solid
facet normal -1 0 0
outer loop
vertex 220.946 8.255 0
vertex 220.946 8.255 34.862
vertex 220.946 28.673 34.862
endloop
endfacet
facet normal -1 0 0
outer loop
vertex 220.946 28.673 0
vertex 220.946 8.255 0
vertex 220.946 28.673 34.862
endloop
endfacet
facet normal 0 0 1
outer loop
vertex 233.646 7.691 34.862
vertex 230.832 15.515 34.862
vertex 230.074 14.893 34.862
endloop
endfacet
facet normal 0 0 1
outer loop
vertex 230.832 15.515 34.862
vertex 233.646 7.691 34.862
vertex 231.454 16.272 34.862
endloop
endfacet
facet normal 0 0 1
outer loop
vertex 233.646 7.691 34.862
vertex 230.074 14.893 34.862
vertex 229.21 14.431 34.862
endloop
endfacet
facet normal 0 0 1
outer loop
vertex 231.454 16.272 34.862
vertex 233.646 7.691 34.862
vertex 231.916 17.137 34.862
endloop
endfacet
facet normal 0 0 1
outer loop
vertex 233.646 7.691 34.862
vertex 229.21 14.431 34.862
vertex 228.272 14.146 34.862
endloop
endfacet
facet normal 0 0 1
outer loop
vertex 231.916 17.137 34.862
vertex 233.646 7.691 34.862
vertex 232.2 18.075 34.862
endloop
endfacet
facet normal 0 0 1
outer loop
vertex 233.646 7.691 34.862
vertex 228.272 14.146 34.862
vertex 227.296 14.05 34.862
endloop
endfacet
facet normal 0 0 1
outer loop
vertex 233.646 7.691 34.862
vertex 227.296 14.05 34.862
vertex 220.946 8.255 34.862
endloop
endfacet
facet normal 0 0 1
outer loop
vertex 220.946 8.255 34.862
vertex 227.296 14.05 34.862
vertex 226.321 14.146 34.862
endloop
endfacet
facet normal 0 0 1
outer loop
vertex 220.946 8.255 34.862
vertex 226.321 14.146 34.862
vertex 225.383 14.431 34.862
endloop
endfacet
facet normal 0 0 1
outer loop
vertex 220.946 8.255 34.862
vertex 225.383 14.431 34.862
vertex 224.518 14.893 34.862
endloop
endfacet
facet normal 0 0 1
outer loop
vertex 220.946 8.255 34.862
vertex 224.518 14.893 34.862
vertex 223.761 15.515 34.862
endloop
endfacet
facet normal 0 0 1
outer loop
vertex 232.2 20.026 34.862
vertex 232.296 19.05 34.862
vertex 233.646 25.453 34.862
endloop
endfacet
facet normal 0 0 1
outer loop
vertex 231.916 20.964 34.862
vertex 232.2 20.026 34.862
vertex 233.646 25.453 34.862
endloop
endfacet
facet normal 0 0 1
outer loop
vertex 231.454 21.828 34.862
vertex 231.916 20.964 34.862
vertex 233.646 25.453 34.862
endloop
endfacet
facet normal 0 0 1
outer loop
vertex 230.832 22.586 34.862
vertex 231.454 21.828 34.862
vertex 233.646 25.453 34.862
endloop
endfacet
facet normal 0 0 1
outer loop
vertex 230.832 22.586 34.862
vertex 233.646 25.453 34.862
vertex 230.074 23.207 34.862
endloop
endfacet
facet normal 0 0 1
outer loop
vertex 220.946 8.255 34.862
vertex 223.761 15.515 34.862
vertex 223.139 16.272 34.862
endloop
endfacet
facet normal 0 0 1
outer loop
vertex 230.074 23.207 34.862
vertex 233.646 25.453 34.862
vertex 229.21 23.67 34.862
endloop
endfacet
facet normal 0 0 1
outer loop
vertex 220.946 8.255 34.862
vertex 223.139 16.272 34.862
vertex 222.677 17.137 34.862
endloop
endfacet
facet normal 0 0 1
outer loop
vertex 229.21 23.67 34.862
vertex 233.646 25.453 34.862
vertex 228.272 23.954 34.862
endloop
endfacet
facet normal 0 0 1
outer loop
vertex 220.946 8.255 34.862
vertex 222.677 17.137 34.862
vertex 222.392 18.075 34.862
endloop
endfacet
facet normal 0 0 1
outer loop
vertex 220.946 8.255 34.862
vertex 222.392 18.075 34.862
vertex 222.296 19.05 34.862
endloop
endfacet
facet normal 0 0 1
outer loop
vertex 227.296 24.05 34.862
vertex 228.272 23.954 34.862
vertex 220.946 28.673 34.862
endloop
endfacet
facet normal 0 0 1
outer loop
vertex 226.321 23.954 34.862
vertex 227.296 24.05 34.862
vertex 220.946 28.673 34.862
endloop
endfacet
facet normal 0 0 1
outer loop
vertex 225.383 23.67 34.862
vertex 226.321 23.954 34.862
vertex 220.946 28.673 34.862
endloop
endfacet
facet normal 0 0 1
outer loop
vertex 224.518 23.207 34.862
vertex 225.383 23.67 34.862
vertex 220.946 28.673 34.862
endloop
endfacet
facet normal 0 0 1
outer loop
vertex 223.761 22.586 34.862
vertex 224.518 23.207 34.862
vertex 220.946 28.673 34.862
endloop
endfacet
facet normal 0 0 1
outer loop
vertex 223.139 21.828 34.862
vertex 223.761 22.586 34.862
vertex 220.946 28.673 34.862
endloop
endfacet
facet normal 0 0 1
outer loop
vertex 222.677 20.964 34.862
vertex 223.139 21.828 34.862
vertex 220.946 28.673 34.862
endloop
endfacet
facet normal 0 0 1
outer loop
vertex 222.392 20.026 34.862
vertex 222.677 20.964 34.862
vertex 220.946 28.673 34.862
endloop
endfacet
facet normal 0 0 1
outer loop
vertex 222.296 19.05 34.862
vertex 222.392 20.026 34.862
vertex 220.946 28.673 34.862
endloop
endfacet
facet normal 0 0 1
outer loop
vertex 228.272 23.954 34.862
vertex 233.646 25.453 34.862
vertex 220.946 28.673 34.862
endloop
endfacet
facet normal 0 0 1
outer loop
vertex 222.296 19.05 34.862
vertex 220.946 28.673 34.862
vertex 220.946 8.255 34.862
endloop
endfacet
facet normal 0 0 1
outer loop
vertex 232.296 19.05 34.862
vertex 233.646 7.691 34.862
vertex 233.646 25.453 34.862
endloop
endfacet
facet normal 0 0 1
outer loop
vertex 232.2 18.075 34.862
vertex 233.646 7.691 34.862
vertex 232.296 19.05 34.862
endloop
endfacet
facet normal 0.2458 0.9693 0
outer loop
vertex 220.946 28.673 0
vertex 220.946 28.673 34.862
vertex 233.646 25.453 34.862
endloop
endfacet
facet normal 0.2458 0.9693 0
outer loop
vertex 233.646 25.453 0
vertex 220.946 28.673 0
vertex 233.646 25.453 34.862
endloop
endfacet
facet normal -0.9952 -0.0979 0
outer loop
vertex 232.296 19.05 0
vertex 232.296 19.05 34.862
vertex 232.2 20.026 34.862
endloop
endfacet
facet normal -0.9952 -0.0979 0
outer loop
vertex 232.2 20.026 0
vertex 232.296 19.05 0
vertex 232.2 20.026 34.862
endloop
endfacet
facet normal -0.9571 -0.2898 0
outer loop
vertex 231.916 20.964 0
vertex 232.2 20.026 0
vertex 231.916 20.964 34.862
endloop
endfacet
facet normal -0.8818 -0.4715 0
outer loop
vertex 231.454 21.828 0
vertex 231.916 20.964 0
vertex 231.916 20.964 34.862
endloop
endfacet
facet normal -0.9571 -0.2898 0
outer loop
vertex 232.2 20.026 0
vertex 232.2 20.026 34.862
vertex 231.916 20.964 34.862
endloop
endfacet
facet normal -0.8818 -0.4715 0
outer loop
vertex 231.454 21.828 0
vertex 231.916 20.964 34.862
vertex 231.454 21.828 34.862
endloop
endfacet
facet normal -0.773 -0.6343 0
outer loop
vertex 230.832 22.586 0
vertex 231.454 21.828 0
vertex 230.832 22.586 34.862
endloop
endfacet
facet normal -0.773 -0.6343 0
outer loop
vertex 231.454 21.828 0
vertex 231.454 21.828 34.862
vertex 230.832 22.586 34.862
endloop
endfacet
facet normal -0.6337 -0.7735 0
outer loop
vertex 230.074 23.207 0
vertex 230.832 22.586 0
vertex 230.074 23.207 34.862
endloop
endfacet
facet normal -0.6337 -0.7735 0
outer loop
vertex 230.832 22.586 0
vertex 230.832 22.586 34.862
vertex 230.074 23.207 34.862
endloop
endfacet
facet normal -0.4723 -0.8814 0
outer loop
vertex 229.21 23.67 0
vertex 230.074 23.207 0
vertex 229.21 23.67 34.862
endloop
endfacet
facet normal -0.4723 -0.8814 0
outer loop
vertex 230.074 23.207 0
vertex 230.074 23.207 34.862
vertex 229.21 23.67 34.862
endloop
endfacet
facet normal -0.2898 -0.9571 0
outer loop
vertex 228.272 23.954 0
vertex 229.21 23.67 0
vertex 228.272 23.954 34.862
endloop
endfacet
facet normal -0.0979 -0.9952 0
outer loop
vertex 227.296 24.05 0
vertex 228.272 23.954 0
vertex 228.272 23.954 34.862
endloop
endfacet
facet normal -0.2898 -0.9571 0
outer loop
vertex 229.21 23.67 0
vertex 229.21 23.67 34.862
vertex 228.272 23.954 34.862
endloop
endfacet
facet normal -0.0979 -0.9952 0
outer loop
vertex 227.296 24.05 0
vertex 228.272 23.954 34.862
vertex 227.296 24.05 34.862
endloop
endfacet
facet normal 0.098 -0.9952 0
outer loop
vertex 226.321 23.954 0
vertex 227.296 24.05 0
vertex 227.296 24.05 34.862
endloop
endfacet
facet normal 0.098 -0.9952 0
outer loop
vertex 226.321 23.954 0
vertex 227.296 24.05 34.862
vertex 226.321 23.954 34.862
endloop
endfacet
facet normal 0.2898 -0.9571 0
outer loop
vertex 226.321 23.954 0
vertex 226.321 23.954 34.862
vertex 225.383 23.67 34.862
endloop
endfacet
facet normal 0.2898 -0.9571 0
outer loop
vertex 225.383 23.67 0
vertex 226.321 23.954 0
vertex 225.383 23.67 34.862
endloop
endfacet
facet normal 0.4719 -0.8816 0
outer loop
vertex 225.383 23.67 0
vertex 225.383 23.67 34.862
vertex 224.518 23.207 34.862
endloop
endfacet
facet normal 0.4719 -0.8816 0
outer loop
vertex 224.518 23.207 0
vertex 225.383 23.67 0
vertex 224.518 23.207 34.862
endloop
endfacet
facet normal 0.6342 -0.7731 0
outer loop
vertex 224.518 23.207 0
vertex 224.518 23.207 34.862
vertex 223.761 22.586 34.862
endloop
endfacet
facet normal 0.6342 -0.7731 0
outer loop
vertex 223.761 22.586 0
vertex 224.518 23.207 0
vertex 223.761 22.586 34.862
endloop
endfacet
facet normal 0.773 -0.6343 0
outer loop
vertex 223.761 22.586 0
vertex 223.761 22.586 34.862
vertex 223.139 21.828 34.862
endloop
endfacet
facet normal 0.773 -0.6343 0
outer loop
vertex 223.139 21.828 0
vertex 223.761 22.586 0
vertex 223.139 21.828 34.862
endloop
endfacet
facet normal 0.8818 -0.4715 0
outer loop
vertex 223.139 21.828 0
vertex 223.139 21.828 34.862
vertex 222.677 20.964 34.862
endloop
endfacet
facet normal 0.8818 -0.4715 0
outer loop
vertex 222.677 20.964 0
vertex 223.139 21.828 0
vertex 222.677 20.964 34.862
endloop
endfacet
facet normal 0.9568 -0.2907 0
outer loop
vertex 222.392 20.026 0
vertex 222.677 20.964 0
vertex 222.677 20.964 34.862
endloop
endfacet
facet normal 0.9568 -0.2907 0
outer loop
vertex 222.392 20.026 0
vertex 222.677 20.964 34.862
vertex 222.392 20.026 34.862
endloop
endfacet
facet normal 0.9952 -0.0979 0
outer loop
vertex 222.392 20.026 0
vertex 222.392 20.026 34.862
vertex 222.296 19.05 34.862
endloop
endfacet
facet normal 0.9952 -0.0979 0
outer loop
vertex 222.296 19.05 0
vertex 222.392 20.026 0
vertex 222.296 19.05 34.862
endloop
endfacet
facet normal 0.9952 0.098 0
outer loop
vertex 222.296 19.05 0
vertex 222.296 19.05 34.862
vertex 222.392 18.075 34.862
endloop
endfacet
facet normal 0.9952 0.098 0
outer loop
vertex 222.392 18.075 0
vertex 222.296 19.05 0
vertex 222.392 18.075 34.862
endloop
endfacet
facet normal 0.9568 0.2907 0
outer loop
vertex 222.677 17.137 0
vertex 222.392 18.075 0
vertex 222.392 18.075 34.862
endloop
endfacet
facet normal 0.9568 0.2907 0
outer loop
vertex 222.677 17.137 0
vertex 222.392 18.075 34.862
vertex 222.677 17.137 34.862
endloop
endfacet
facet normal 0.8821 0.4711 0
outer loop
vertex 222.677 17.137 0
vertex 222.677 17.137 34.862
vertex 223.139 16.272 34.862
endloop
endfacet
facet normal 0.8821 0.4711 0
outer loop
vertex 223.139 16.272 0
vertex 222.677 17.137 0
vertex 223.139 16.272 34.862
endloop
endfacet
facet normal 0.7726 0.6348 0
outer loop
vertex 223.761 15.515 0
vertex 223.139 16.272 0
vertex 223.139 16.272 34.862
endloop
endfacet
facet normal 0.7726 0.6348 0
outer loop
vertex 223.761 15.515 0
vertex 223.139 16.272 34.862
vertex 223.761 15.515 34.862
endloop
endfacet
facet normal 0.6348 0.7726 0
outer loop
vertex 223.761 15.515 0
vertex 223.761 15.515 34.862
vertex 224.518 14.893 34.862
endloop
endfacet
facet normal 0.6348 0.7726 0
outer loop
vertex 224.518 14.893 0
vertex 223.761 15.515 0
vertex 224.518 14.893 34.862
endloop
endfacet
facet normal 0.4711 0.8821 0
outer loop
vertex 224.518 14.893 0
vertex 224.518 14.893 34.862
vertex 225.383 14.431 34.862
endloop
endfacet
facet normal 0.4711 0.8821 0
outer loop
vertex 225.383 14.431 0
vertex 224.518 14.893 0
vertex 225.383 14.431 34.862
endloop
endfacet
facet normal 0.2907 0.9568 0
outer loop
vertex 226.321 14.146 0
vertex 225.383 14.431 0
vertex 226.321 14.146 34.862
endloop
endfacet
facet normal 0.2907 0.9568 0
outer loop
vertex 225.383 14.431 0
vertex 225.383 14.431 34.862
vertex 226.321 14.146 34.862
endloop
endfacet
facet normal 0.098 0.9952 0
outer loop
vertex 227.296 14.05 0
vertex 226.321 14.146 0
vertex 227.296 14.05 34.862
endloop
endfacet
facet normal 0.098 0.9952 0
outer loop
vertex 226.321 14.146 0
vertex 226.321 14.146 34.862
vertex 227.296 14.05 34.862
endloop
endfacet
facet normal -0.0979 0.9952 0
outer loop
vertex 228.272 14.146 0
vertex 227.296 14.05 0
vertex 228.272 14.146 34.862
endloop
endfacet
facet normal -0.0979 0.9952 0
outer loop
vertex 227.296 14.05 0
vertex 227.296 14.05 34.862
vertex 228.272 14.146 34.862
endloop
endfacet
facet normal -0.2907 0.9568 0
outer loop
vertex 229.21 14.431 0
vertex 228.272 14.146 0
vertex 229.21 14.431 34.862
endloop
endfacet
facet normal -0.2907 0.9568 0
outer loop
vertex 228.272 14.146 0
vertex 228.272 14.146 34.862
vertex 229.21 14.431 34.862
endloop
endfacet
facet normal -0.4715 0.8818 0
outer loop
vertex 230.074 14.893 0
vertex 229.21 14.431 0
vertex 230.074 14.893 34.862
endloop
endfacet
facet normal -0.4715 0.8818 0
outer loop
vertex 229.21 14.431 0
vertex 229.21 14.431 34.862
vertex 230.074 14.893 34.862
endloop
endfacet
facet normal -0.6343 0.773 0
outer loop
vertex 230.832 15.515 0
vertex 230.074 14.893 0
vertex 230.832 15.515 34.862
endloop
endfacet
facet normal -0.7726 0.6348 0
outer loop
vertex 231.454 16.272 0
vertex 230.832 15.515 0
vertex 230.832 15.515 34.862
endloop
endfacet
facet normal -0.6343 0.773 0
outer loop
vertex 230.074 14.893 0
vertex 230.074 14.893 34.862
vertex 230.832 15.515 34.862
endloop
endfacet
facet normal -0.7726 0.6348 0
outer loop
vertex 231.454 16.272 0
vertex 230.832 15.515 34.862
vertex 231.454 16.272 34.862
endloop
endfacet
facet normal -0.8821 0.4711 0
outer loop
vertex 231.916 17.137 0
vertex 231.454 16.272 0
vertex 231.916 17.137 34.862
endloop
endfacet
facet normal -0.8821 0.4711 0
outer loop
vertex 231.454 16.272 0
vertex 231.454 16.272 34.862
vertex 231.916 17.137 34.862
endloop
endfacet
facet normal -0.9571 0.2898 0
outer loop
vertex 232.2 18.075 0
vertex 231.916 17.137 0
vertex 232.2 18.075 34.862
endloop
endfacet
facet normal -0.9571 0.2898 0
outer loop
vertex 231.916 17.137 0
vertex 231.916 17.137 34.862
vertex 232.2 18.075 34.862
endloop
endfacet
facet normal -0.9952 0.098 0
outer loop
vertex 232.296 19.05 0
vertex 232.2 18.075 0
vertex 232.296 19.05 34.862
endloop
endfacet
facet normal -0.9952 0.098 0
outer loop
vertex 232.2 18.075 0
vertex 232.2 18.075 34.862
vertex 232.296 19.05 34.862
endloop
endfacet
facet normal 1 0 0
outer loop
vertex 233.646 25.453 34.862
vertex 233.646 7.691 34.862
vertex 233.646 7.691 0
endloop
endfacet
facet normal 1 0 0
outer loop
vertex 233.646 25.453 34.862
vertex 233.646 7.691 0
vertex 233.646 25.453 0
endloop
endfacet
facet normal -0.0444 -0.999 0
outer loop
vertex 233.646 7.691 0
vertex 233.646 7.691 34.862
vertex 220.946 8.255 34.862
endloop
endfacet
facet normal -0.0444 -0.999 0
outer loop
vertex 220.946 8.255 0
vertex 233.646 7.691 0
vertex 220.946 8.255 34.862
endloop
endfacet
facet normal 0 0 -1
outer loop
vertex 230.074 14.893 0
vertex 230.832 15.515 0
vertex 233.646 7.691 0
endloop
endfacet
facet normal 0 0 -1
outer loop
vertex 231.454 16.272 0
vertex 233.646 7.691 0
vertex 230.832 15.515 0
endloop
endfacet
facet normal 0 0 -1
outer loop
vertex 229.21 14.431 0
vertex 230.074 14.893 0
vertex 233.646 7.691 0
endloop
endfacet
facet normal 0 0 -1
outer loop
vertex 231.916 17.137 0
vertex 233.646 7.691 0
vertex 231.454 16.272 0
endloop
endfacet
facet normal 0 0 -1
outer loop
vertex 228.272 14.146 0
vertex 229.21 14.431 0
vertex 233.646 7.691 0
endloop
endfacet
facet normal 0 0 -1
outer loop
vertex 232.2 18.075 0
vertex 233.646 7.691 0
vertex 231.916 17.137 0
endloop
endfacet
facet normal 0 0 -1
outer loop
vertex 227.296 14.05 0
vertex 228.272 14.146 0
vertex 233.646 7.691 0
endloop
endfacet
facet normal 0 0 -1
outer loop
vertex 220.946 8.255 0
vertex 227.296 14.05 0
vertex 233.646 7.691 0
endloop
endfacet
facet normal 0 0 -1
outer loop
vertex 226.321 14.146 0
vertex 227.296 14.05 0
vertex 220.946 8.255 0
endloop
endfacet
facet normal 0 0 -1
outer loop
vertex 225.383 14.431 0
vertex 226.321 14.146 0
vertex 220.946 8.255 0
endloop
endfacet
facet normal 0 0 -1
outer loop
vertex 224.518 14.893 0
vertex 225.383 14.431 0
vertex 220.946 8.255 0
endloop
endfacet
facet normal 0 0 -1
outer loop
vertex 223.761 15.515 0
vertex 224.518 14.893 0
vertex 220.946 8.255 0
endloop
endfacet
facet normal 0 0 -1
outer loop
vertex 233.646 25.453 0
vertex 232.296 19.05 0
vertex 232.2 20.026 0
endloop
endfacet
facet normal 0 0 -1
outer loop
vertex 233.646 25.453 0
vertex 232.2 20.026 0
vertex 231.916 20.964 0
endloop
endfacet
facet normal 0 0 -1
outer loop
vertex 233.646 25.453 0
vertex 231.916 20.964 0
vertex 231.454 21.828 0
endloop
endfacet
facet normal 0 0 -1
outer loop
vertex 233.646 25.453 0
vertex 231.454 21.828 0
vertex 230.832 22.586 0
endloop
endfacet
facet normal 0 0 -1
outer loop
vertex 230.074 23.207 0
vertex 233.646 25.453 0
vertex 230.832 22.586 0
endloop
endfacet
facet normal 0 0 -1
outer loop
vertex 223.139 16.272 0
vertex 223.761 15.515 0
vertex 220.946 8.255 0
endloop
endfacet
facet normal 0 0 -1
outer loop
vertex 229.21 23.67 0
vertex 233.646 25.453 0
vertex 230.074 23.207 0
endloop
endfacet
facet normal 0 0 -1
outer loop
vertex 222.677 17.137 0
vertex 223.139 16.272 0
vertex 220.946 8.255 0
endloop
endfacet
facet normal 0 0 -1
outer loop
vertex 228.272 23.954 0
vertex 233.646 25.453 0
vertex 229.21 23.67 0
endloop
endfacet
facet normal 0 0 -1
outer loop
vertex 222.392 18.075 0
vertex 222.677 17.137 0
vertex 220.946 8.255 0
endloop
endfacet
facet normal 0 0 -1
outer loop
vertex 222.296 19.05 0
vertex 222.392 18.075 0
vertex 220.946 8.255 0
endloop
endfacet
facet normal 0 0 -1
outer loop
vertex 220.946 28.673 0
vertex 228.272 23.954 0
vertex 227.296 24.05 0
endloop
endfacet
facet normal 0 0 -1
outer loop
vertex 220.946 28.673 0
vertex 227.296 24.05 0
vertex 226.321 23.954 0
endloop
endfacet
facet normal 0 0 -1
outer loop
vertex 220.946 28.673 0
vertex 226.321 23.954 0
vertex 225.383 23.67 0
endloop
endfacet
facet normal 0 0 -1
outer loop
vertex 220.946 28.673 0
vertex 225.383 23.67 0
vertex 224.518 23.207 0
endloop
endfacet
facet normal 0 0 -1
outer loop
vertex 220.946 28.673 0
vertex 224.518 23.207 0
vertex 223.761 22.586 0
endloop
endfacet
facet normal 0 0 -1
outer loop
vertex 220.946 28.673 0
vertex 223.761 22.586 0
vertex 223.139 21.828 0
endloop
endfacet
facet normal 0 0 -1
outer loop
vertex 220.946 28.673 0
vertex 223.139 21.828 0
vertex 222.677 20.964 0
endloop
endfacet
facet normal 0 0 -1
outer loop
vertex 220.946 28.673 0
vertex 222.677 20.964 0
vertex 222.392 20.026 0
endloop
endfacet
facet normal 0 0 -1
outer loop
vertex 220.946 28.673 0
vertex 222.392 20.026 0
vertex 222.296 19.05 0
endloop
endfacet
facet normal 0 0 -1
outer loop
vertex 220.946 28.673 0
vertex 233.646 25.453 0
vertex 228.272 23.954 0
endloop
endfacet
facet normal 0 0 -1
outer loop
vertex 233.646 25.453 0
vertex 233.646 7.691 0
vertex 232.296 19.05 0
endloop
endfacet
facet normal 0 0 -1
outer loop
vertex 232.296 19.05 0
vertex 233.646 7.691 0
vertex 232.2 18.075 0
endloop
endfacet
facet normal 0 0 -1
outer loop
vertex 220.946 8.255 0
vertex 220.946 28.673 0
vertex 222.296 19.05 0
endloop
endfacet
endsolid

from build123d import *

# Parameters (mm, degrees)
BOSS_EXTRUDE1_DEPTH = 34.8615
SKETCH2_R           = 6.35
SKETCH2_R_2         = 5
SKETCH2_W           = 138.882076439
SKETCH2_H           = 152.274276667
CUT_EXTRUDE1_DEPTH  = 318.646799811
SKETCH3_W           = 293.18888876
SKETCH3_H           = 137.971241769
CUT_EXTRUDE2_DEPTH  = 242.109386719


with BuildPart() as part:
    # Sketch1 → Boss-Extrude1 (new body)
    with BuildSketch(Plane.XY):
        with BuildLine():
            add(Edge.make_bspline(
                [(0.000560351, 0.000130087), (0.810633127, 7.359196055), (8.649092025, 17.856605174), (26.286719818, 29.975176328), (52.111128271, 42.069215275), (89.597618475, 49.290763054), (131.400792109, 47.884831915), (173.256699242, 40.041104278), (217.961060472, 29.612974894), (256.952064401, 19.528920948), (290.35983767, 8.71099439), (301.273197721, 4.382828139), (314.816918223, -0.516206742), (309.846313895, 0.000130087)],
                knots=[0, 0, 0, 0, 0.060863618, 0.113688265, 0.188608742, 0.312908923, 0.448482434, 0.557612135, 0.691544113, 0.852438279, 0.92975597, 0.976058229, 1, 1, 1, 1], degree=3))
            add(Edge.make_bspline(
                [(309.846313895, 0.000130087), (303.956832565, 1.47095521), (293.989507544, 2.093987313), (276.26402299, 4.514356704), (260.846344817, 5.427413394), (235.858814759, 7.870306192), (205.101424636, 8.838080282), (157.718638092, 9.030650149), (110.497331172, 6.181495223), (66.506197185, -0.586669107), (36.454672816, -6.098499901), (15.316603331, -6.189065841), (1.230714189, -6.924076091), (0.000560351, 0.000130087)],
                knots=[0, 0, 0, 0, 0.057787081, 0.095274891, 0.171021118, 0.205339302, 0.335319146, 0.464904334, 0.658702312, 0.785511947, 0.893517288, 0.94309214, 1, 1, 1, 1], degree=3))
        make_face()
    extrude(amount=BOSS_EXTRUDE1_DEPTH)

    # Sketch2 → Cut-Extrude1 (cut, through all)
    with BuildSketch(Plane.XY.offset(34.8615)):
        with Locations((20.32, 10.16)):
            Circle(SKETCH2_R)
        with Locations((227.296313895, 19.050130087)):
            Circle(SKETCH2_R_2)
        with Locations((303.087352115, 19.854149729)):
            Rectangle(SKETCH2_W, SKETCH2_H)
    extrude(amount=-CUT_EXTRUDE1_DEPTH, mode=Mode.SUBTRACT)

    # Sketch3 → Cut-Extrude2 (cut, through all)
    with BuildSketch(Plane.XY.offset(34.8615)):
        with Locations((74.351869515, 19.480058122)):
            Rectangle(SKETCH3_W, SKETCH3_H)
    extrude(amount=-CUT_EXTRUDE2_DEPTH, mode=Mode.SUBTRACT)


solid = part.part
